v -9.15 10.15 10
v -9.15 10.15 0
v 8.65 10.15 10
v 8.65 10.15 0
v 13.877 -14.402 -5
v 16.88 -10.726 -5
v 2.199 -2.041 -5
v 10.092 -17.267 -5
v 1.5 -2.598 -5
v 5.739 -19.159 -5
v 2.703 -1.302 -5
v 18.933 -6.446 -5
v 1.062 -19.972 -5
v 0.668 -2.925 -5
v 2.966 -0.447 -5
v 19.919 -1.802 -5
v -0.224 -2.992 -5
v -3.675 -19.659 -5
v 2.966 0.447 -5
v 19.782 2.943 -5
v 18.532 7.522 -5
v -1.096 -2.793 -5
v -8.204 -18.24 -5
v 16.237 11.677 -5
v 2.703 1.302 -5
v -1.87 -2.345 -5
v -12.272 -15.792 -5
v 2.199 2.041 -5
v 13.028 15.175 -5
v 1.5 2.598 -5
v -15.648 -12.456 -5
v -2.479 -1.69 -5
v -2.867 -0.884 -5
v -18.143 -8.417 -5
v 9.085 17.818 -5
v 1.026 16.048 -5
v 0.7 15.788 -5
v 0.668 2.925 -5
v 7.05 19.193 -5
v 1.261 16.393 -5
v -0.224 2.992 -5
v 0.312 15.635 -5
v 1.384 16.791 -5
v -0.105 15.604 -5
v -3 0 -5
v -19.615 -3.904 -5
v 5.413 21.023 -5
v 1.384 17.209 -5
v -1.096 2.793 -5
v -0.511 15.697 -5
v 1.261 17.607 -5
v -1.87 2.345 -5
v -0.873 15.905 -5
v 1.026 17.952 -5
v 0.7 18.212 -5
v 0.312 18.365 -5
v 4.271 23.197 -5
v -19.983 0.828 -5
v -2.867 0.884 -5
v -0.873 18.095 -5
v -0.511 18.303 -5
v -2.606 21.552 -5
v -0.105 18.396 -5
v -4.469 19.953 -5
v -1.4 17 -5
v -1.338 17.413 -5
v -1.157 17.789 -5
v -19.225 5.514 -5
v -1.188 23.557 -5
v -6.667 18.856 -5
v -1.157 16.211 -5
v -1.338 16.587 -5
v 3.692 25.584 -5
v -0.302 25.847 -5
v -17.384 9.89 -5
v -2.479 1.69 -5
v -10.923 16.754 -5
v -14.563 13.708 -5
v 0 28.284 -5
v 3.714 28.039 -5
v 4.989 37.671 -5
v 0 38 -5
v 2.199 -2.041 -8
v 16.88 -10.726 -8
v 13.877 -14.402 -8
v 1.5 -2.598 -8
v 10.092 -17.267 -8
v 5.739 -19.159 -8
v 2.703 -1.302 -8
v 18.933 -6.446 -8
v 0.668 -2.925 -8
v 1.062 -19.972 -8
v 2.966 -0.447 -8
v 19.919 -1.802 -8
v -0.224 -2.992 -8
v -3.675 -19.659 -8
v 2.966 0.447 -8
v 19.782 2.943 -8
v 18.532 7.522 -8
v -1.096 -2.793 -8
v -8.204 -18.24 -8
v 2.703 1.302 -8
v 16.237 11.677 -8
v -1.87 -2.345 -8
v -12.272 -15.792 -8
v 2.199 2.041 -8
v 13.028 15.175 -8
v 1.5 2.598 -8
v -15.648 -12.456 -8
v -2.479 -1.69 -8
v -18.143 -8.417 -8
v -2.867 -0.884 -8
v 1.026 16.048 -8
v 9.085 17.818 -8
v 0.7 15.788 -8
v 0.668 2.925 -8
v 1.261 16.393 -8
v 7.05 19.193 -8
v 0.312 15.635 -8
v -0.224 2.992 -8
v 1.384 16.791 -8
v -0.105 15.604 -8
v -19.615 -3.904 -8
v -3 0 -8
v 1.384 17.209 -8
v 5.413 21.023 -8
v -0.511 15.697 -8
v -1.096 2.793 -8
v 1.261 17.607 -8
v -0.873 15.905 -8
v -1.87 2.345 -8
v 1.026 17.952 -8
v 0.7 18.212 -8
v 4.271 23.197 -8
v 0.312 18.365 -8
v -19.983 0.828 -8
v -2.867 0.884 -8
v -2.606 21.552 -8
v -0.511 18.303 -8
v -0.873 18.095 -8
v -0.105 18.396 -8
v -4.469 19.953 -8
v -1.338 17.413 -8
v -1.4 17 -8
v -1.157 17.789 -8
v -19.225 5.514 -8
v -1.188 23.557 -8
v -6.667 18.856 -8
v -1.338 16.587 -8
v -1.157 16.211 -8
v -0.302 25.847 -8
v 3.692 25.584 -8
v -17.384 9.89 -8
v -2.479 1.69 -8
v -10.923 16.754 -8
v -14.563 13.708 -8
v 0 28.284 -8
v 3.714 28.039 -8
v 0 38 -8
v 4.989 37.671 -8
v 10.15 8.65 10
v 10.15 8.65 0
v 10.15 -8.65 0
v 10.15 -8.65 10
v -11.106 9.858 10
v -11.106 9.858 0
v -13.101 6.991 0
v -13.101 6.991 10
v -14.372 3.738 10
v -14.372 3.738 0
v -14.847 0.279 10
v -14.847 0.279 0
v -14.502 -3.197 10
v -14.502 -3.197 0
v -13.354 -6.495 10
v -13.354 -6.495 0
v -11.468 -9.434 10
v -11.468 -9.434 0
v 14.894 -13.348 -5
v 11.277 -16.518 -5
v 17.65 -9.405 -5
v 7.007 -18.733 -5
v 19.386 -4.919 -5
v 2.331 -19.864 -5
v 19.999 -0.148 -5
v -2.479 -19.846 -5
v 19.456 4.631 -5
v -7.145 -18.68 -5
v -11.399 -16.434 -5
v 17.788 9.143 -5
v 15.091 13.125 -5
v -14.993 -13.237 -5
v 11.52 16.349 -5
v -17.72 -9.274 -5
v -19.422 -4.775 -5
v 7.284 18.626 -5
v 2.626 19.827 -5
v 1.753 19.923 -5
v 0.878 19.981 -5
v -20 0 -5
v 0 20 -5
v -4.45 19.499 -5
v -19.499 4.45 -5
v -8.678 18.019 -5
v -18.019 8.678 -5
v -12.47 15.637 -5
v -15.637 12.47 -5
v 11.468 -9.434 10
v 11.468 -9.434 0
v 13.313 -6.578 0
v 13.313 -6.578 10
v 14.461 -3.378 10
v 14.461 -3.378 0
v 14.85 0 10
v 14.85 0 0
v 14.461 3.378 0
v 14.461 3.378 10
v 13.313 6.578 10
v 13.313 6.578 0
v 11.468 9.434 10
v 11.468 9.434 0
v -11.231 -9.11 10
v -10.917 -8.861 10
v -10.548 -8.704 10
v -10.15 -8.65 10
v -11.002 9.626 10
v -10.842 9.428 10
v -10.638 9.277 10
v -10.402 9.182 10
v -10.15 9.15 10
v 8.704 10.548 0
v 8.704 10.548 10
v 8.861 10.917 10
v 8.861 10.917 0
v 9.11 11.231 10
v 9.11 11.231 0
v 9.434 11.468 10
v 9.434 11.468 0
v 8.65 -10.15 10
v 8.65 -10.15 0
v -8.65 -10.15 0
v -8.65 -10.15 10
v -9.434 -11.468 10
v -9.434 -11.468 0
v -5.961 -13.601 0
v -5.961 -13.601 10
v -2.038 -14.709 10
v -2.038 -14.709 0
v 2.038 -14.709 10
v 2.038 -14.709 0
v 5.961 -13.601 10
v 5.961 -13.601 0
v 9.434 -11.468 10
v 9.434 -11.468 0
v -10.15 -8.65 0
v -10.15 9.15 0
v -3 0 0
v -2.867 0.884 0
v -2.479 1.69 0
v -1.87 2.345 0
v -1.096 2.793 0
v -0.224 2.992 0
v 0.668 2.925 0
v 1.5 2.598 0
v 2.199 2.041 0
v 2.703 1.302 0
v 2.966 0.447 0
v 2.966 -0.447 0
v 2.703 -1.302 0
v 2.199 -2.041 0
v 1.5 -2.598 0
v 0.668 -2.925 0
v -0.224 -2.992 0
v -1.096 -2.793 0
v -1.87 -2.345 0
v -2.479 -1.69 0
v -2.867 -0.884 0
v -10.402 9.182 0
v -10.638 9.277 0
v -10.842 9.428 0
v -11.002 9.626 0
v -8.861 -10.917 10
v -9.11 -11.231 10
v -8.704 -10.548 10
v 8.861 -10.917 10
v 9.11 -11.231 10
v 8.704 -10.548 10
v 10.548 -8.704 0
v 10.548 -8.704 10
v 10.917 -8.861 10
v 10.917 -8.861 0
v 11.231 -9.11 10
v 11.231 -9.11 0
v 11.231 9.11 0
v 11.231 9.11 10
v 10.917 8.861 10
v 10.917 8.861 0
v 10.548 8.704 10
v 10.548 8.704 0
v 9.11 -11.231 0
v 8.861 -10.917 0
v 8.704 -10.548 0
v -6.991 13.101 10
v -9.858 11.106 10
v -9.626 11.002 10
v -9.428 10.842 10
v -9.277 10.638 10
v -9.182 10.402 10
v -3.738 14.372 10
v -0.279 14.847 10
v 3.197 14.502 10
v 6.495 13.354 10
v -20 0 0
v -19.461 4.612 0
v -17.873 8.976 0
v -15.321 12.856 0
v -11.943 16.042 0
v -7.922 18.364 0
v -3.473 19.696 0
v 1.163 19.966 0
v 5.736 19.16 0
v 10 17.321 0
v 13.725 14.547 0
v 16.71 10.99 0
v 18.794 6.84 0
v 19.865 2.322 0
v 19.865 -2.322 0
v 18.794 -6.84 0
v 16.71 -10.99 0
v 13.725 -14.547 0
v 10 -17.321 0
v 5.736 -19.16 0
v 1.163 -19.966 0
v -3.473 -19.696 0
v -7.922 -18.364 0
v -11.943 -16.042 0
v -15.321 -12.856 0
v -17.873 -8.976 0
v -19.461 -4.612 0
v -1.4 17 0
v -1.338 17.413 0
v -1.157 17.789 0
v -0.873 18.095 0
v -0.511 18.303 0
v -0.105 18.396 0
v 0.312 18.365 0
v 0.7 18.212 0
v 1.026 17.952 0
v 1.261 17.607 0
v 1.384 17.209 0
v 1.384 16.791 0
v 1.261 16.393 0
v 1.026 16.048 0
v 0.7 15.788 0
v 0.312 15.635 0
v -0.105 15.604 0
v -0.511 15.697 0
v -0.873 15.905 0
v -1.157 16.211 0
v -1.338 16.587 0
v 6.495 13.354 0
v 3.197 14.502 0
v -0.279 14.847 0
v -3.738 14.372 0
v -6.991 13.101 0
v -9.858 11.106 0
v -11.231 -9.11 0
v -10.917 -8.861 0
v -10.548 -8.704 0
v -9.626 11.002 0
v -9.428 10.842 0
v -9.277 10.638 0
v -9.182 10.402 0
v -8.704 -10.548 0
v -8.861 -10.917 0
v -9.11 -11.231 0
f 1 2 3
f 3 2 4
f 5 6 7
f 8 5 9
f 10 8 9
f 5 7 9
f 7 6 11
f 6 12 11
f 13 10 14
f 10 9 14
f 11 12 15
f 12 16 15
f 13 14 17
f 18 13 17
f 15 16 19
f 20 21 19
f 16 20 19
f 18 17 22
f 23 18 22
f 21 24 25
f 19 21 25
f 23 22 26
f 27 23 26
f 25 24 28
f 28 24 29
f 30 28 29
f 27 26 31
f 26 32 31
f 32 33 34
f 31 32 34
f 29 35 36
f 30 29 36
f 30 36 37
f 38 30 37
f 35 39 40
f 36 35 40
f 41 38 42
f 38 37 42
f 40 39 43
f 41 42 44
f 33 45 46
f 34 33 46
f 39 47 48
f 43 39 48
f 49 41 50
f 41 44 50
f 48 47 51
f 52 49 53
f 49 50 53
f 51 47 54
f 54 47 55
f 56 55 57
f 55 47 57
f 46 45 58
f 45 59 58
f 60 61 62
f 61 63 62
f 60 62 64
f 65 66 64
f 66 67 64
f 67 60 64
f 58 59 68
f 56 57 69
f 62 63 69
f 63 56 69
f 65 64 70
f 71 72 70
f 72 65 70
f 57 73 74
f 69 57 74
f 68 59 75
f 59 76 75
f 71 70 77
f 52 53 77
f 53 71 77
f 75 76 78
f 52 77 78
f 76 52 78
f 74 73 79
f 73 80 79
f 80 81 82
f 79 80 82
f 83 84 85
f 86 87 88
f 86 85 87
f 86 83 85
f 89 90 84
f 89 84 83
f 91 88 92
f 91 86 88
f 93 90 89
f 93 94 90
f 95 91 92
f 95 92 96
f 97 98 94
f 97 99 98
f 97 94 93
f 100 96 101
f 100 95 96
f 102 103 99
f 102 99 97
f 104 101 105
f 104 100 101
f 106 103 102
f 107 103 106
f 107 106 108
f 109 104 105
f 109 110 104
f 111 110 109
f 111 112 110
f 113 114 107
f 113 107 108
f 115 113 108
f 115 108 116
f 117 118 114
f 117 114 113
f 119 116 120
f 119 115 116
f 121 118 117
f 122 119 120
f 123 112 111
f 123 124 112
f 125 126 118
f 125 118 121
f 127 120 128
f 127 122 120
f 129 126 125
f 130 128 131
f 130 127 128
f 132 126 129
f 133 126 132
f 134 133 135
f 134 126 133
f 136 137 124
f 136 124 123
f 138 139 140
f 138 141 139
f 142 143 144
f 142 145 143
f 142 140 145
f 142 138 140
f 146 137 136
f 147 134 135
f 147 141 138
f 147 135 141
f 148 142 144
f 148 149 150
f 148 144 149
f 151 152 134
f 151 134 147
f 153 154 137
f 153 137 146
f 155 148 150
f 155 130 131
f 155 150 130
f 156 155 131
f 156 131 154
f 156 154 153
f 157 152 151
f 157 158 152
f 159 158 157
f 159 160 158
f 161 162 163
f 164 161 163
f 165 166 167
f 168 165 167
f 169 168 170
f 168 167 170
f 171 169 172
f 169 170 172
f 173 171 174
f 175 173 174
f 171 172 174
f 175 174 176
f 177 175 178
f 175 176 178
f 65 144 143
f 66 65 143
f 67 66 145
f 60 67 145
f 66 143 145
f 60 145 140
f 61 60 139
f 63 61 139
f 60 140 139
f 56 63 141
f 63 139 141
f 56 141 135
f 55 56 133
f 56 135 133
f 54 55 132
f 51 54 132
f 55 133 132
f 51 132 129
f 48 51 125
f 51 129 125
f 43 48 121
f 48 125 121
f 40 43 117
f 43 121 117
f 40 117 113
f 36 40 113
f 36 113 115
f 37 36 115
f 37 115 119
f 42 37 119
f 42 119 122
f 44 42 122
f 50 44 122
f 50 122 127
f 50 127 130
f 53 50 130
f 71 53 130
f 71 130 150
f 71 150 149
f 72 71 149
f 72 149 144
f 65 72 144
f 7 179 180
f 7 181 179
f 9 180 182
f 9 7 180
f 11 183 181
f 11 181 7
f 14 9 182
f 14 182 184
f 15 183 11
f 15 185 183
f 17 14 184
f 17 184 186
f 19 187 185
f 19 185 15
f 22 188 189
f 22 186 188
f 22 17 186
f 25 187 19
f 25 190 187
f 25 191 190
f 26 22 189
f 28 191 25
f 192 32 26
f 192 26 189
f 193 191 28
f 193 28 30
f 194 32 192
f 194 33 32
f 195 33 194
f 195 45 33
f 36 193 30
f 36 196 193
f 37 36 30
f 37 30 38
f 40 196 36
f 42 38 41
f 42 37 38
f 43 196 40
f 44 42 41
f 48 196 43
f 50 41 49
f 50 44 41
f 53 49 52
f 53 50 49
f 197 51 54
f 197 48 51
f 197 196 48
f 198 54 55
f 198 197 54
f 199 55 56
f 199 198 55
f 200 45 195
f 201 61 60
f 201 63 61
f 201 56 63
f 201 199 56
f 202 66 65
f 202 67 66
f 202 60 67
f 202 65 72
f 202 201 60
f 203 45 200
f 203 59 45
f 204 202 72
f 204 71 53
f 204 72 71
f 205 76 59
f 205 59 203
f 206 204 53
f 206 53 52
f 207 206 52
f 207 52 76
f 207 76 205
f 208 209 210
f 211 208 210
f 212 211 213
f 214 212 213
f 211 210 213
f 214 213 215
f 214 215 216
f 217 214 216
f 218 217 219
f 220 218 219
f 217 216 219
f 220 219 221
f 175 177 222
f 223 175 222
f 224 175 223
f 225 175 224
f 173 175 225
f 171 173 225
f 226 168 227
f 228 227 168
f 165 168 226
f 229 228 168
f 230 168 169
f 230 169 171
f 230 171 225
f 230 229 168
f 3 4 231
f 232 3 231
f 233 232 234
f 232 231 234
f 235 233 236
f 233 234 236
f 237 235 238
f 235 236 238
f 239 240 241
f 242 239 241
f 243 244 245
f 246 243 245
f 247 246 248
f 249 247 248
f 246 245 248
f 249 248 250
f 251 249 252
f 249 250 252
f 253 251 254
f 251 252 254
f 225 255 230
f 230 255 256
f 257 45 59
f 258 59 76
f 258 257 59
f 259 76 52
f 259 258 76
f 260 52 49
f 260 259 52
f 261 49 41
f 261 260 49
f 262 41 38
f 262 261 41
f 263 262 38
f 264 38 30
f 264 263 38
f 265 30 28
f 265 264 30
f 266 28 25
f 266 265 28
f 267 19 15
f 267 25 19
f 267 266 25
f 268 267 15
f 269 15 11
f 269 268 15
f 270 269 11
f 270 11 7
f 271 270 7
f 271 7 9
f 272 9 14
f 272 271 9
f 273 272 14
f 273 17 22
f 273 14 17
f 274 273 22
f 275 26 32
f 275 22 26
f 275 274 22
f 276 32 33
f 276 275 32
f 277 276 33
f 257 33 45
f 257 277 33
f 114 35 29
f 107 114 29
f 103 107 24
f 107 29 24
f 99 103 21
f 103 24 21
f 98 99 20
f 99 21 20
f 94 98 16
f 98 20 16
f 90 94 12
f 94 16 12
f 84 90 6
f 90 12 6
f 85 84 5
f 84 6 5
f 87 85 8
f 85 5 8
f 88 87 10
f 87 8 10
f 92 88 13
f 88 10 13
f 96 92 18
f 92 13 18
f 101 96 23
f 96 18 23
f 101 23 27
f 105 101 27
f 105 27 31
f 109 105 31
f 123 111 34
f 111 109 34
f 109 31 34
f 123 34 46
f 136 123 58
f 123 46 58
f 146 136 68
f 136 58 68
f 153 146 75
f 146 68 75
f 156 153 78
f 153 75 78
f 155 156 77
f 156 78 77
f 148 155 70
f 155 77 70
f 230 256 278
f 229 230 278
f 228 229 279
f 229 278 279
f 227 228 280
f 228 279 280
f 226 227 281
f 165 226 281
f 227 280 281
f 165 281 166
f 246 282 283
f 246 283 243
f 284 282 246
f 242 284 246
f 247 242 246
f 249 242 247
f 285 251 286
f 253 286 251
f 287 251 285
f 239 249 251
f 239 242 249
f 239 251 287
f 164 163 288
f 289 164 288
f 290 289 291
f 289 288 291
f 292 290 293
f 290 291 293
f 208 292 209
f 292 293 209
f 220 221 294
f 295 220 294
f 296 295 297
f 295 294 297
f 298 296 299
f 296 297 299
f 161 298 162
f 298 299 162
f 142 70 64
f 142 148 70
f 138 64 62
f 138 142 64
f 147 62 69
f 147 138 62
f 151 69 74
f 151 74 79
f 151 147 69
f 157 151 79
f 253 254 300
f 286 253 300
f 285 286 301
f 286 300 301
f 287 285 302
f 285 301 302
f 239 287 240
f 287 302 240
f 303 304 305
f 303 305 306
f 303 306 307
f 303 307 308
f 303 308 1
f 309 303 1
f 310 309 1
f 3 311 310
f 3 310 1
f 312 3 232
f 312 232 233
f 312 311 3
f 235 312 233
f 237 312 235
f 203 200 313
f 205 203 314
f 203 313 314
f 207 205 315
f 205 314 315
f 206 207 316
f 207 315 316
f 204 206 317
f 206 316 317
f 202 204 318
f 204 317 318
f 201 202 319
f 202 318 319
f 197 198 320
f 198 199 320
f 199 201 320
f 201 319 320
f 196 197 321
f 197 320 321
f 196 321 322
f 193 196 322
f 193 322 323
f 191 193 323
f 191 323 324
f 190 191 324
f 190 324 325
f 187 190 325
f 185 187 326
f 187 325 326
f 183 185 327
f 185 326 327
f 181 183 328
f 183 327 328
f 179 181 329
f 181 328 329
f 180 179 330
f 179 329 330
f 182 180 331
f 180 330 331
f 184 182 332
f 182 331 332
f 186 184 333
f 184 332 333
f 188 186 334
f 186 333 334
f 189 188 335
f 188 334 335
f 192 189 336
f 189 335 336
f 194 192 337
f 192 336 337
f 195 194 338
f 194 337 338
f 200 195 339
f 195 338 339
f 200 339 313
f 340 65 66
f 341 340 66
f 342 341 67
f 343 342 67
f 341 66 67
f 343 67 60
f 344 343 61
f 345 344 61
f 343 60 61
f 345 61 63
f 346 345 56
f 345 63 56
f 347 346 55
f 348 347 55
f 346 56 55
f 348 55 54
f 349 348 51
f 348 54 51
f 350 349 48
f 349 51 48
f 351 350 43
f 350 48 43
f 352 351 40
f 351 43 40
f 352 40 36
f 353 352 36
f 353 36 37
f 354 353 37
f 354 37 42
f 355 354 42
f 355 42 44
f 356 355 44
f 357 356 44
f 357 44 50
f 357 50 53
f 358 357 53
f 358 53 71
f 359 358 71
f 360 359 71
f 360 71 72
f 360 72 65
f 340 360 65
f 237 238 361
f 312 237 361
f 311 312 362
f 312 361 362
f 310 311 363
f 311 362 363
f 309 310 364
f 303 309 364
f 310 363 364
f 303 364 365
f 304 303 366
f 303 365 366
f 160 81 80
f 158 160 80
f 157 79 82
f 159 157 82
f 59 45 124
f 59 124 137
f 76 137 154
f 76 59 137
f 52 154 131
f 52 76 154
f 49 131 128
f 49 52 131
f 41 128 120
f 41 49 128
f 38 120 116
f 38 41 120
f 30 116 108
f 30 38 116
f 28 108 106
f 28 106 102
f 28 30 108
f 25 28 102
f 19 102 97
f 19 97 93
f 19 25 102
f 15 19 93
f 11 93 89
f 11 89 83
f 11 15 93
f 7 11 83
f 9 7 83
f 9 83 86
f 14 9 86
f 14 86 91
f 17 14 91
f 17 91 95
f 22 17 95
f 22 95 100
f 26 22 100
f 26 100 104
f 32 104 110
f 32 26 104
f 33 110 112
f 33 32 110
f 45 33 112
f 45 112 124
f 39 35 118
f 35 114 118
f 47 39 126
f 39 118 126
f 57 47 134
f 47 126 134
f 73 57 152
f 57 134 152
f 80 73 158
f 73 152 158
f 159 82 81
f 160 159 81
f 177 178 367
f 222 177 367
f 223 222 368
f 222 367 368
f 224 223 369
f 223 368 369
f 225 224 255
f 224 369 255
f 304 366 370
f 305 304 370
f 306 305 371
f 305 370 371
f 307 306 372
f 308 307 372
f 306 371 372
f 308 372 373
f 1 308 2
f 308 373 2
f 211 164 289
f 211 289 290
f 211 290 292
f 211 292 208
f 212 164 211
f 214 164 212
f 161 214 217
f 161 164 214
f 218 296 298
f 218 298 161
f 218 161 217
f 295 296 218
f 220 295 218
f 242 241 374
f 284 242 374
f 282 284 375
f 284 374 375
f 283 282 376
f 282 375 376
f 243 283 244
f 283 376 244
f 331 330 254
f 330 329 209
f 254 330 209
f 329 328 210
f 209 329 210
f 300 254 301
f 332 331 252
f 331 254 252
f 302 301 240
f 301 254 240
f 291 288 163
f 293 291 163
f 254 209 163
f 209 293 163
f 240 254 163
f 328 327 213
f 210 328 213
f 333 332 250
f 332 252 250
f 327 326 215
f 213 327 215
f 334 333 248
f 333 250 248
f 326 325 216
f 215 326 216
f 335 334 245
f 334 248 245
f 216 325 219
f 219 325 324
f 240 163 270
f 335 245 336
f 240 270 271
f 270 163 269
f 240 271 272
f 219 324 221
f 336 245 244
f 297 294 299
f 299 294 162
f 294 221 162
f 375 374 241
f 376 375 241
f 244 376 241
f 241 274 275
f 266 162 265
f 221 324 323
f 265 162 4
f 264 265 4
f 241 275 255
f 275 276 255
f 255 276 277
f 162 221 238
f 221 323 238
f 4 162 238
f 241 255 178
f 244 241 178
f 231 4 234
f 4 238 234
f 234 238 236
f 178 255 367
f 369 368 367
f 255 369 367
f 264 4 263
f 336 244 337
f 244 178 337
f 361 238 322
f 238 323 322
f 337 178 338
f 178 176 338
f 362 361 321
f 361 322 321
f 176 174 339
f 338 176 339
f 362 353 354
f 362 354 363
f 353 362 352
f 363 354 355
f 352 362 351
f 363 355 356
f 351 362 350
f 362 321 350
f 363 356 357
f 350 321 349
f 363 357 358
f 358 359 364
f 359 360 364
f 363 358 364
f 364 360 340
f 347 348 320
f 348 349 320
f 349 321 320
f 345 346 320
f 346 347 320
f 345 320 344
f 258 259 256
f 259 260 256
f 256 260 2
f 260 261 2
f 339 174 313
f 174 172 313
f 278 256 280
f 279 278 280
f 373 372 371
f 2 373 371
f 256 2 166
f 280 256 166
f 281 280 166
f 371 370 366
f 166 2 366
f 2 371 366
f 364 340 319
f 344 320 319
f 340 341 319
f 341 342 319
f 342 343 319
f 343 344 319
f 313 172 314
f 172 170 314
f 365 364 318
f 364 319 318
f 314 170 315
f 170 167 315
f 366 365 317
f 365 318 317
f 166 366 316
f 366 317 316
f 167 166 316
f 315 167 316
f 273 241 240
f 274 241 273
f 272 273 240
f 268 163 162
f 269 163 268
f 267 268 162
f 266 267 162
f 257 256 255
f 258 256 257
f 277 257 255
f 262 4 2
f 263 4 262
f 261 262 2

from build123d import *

# Parameters (mm, degrees)
EXTRUDE_1_DEPTH     = 10
EXTRUDE_1_2_DEPTH   = 10
EXTRUDE_1_3_DEPTH   = 10
EXTRUDE_1_4_DEPTH   = 10
SKETCH_3_R          = 20
SKETCH_3_R_2        = 3
EXTRUDE_3_DEPTH     = 5
SKETCH_4_R          = 20
SKETCH_4_R_2        = 3
EXTRUDE_4_DEPTH     = 3
EXTRUDE_START       = -3
EXTRUDE_7_DEPTH     = 3
FILLET_2_R          = 10
SKETCH_5_R          = 1.4
CUT_EXTRUDE_1_DEPTH = 10


with BuildPart() as part:
    # 草图1 → 凸台-拉伸1 (new body)
    with BuildSketch(Plane.XY):
        with BuildLine():
            ThreePointArc((-9.857615433, 11.106300823), (-9.346139139, 10.744817381), (-9.15, 10.15))
            Line((-9.15, 10.15), (8.65, 10.15))
            ThreePointArc((8.65, 10.15), (8.860862551, 10.916892847), (9.434166184, 11.468173717))
            ThreePointArc((9.434166184, 11.468173717), (-0.278505501, 14.847388144), (-9.857615433, 11.106300823))
        make_face()
    extrude(amount=EXTRUDE_1_DEPTH)



with BuildPart() as body_2:
    # 草图1 → Extrude 1 2 (new body)
    with BuildSketch(Plane.XY):
        with BuildLine():
            Line((-10.15, -8.65), (-10.15, 9.15))
            ThreePointArc((-10.15, 9.15), (-10.744817381, 9.346139139), (-11.106300823, 9.857615433))
            ThreePointArc((-11.106300823, 9.857615433), (-14.847388144, 0.278505501), (-11.468173717, -9.434166184))
            ThreePointArc((-11.468173717, -9.434166184), (-10.916892847, -8.860862551), (-10.15, -8.65))
        make_face()
    extrude(amount=EXTRUDE_1_2_DEPTH)


with BuildPart() as body_3:
    # 草图1 → Extrude 1 3 (new body)
    with BuildSketch(Plane.XY):
        with BuildLine():
            ThreePointArc((11.468173717, 9.434166184), (10.916892847, 8.860862551), (10.15, 8.65))
            Line((10.15, 8.65), (10.15, -8.65))
            ThreePointArc((10.15, -8.65), (10.916892847, -8.860862551), (11.468173717, -9.434166184))
            ThreePointArc((11.468173717, -9.434166184), (13.978999959, -5.010993928), (14.85, 0))
            ThreePointArc((14.85, 0), (13.978999959, 5.010993928), (11.468173717, 9.434166184))
        make_face()
    extrude(amount=EXTRUDE_1_3_DEPTH)


with BuildPart() as body_4:
    # 草图1 → Extrude 1 4 (new body)
    with BuildSketch(Plane.XY):
        with BuildLine():
            Line((8.65, -10.15), (-8.65, -10.15))
            ThreePointArc((-8.65, -10.15), (-8.860862551, -10.916892847), (-9.434166184, -11.468173717))
            ThreePointArc((-9.434166184, -11.468173717), (0, -14.85), (9.434166184, -11.468173717))
            ThreePointArc((9.434166184, -11.468173717), (8.860862551, -10.916892847), (8.65, -10.15))
        make_face()
    extrude(amount=EXTRUDE_1_4_DEPTH)


with BuildPart() as part_1:
    add(part.part)

    add(body_2.part)  # 凸台-拉伸3 merges body 2

    add(body_3.part)  # 凸台-拉伸3 merges body 3

    add(body_4.part)  # 凸台-拉伸3 merges body 4
    # 草图3 → 凸台-拉伸3 (add)
    with BuildSketch(Plane(origin=(0, 0, 0), x_dir=(-1, 0, 0), z_dir=(0, 0, -1))):
        Circle(SKETCH_3_R)
        Circle(SKETCH_3_R_2, mode=Mode.SUBTRACT)
    extrude(amount=EXTRUDE_3_DEPTH)

    # 草图4 → 凸台-拉伸4 (add)
    with BuildSketch(Plane(origin=(0, 0, -5), x_dir=(-1, 0, 0), z_dir=(0, 0, -1))):
        Circle(SKETCH_4_R)
        Circle(SKETCH_4_R_2, mode=Mode.SUBTRACT)
    extrude(amount=EXTRUDE_4_DEPTH)

    # 草图9 → 凸台-拉伸7 (add)
    with BuildSketch(Plane(origin=(0, 0, -8), x_dir=(-1, 0, 0), z_dir=(0, 0, -1)).offset(EXTRUDE_START)):
        with BuildLine():
            Line((0, 20), (0, 38))
            Line((0, 38), (-4.989167629, 37.671052632))
            Line((-4.989167629, 37.671052632), (-2.625877699, 19.826869806))
            ThreePointArc((-2.625877699, 19.826869806), (-1.315789474, 19.956670515), (0, 20))
        make_face()
    extrude(amount=EXTRUDE_7_DEPTH)

    # 圆角2
    fillet_2_edges = [part_1.edges().sort_by_distance(p)[0] for p in [
        (0, 20, -6.5),
        (2.625877699, 19.826869806, -6.5),
    ]]
    fillet(fillet_2_edges, radius=FILLET_2_R)


with BuildPart() as body_2_2:
    # Split Bodies 1: the piece on the far side of the plane
    add(part_1.part)
    split(bisect_by=Plane(origin=(0, 0, -5), x_dir=(-1, 0, 0), z_dir=(0, 0, -1)), keep=Keep.BOTTOM)


with BuildPart() as part_2:
    add(part_1.part)

    # Split Bodies 1
    split(bisect_by=Plane(origin=(0, 0, -5), x_dir=(-1, 0, 0), z_dir=(0, 0, -1)), keep=Keep.TOP)


with BuildPart() as cut_extrude_1_tool:
    # 草图5 → 切除-拉伸1 (new body)
    with BuildSketch(Plane(origin=(0, 0, -8), x_dir=(-1, 0, 0), z_dir=(0, 0, -1))):
        with Locations((0, 17)):
            Circle(SKETCH_5_R)
    extrude(amount=-CUT_EXTRUDE_1_DEPTH)


with BuildPart() as part_3:
    add(part_2.part)

    # 切除-拉伸1: cut by cut_extrude_1_tool
    add(cut_extrude_1_tool.part, mode=Mode.SUBTRACT)


with BuildPart() as body_2_2_1:
    add(body_2_2.part)

    # 切除-拉伸1: cut by cut_extrude_1_tool
    add(cut_extrude_1_tool.part, mode=Mode.SUBTRACT)


solid = Compound([part_3.part, body_2_2_1.part])
